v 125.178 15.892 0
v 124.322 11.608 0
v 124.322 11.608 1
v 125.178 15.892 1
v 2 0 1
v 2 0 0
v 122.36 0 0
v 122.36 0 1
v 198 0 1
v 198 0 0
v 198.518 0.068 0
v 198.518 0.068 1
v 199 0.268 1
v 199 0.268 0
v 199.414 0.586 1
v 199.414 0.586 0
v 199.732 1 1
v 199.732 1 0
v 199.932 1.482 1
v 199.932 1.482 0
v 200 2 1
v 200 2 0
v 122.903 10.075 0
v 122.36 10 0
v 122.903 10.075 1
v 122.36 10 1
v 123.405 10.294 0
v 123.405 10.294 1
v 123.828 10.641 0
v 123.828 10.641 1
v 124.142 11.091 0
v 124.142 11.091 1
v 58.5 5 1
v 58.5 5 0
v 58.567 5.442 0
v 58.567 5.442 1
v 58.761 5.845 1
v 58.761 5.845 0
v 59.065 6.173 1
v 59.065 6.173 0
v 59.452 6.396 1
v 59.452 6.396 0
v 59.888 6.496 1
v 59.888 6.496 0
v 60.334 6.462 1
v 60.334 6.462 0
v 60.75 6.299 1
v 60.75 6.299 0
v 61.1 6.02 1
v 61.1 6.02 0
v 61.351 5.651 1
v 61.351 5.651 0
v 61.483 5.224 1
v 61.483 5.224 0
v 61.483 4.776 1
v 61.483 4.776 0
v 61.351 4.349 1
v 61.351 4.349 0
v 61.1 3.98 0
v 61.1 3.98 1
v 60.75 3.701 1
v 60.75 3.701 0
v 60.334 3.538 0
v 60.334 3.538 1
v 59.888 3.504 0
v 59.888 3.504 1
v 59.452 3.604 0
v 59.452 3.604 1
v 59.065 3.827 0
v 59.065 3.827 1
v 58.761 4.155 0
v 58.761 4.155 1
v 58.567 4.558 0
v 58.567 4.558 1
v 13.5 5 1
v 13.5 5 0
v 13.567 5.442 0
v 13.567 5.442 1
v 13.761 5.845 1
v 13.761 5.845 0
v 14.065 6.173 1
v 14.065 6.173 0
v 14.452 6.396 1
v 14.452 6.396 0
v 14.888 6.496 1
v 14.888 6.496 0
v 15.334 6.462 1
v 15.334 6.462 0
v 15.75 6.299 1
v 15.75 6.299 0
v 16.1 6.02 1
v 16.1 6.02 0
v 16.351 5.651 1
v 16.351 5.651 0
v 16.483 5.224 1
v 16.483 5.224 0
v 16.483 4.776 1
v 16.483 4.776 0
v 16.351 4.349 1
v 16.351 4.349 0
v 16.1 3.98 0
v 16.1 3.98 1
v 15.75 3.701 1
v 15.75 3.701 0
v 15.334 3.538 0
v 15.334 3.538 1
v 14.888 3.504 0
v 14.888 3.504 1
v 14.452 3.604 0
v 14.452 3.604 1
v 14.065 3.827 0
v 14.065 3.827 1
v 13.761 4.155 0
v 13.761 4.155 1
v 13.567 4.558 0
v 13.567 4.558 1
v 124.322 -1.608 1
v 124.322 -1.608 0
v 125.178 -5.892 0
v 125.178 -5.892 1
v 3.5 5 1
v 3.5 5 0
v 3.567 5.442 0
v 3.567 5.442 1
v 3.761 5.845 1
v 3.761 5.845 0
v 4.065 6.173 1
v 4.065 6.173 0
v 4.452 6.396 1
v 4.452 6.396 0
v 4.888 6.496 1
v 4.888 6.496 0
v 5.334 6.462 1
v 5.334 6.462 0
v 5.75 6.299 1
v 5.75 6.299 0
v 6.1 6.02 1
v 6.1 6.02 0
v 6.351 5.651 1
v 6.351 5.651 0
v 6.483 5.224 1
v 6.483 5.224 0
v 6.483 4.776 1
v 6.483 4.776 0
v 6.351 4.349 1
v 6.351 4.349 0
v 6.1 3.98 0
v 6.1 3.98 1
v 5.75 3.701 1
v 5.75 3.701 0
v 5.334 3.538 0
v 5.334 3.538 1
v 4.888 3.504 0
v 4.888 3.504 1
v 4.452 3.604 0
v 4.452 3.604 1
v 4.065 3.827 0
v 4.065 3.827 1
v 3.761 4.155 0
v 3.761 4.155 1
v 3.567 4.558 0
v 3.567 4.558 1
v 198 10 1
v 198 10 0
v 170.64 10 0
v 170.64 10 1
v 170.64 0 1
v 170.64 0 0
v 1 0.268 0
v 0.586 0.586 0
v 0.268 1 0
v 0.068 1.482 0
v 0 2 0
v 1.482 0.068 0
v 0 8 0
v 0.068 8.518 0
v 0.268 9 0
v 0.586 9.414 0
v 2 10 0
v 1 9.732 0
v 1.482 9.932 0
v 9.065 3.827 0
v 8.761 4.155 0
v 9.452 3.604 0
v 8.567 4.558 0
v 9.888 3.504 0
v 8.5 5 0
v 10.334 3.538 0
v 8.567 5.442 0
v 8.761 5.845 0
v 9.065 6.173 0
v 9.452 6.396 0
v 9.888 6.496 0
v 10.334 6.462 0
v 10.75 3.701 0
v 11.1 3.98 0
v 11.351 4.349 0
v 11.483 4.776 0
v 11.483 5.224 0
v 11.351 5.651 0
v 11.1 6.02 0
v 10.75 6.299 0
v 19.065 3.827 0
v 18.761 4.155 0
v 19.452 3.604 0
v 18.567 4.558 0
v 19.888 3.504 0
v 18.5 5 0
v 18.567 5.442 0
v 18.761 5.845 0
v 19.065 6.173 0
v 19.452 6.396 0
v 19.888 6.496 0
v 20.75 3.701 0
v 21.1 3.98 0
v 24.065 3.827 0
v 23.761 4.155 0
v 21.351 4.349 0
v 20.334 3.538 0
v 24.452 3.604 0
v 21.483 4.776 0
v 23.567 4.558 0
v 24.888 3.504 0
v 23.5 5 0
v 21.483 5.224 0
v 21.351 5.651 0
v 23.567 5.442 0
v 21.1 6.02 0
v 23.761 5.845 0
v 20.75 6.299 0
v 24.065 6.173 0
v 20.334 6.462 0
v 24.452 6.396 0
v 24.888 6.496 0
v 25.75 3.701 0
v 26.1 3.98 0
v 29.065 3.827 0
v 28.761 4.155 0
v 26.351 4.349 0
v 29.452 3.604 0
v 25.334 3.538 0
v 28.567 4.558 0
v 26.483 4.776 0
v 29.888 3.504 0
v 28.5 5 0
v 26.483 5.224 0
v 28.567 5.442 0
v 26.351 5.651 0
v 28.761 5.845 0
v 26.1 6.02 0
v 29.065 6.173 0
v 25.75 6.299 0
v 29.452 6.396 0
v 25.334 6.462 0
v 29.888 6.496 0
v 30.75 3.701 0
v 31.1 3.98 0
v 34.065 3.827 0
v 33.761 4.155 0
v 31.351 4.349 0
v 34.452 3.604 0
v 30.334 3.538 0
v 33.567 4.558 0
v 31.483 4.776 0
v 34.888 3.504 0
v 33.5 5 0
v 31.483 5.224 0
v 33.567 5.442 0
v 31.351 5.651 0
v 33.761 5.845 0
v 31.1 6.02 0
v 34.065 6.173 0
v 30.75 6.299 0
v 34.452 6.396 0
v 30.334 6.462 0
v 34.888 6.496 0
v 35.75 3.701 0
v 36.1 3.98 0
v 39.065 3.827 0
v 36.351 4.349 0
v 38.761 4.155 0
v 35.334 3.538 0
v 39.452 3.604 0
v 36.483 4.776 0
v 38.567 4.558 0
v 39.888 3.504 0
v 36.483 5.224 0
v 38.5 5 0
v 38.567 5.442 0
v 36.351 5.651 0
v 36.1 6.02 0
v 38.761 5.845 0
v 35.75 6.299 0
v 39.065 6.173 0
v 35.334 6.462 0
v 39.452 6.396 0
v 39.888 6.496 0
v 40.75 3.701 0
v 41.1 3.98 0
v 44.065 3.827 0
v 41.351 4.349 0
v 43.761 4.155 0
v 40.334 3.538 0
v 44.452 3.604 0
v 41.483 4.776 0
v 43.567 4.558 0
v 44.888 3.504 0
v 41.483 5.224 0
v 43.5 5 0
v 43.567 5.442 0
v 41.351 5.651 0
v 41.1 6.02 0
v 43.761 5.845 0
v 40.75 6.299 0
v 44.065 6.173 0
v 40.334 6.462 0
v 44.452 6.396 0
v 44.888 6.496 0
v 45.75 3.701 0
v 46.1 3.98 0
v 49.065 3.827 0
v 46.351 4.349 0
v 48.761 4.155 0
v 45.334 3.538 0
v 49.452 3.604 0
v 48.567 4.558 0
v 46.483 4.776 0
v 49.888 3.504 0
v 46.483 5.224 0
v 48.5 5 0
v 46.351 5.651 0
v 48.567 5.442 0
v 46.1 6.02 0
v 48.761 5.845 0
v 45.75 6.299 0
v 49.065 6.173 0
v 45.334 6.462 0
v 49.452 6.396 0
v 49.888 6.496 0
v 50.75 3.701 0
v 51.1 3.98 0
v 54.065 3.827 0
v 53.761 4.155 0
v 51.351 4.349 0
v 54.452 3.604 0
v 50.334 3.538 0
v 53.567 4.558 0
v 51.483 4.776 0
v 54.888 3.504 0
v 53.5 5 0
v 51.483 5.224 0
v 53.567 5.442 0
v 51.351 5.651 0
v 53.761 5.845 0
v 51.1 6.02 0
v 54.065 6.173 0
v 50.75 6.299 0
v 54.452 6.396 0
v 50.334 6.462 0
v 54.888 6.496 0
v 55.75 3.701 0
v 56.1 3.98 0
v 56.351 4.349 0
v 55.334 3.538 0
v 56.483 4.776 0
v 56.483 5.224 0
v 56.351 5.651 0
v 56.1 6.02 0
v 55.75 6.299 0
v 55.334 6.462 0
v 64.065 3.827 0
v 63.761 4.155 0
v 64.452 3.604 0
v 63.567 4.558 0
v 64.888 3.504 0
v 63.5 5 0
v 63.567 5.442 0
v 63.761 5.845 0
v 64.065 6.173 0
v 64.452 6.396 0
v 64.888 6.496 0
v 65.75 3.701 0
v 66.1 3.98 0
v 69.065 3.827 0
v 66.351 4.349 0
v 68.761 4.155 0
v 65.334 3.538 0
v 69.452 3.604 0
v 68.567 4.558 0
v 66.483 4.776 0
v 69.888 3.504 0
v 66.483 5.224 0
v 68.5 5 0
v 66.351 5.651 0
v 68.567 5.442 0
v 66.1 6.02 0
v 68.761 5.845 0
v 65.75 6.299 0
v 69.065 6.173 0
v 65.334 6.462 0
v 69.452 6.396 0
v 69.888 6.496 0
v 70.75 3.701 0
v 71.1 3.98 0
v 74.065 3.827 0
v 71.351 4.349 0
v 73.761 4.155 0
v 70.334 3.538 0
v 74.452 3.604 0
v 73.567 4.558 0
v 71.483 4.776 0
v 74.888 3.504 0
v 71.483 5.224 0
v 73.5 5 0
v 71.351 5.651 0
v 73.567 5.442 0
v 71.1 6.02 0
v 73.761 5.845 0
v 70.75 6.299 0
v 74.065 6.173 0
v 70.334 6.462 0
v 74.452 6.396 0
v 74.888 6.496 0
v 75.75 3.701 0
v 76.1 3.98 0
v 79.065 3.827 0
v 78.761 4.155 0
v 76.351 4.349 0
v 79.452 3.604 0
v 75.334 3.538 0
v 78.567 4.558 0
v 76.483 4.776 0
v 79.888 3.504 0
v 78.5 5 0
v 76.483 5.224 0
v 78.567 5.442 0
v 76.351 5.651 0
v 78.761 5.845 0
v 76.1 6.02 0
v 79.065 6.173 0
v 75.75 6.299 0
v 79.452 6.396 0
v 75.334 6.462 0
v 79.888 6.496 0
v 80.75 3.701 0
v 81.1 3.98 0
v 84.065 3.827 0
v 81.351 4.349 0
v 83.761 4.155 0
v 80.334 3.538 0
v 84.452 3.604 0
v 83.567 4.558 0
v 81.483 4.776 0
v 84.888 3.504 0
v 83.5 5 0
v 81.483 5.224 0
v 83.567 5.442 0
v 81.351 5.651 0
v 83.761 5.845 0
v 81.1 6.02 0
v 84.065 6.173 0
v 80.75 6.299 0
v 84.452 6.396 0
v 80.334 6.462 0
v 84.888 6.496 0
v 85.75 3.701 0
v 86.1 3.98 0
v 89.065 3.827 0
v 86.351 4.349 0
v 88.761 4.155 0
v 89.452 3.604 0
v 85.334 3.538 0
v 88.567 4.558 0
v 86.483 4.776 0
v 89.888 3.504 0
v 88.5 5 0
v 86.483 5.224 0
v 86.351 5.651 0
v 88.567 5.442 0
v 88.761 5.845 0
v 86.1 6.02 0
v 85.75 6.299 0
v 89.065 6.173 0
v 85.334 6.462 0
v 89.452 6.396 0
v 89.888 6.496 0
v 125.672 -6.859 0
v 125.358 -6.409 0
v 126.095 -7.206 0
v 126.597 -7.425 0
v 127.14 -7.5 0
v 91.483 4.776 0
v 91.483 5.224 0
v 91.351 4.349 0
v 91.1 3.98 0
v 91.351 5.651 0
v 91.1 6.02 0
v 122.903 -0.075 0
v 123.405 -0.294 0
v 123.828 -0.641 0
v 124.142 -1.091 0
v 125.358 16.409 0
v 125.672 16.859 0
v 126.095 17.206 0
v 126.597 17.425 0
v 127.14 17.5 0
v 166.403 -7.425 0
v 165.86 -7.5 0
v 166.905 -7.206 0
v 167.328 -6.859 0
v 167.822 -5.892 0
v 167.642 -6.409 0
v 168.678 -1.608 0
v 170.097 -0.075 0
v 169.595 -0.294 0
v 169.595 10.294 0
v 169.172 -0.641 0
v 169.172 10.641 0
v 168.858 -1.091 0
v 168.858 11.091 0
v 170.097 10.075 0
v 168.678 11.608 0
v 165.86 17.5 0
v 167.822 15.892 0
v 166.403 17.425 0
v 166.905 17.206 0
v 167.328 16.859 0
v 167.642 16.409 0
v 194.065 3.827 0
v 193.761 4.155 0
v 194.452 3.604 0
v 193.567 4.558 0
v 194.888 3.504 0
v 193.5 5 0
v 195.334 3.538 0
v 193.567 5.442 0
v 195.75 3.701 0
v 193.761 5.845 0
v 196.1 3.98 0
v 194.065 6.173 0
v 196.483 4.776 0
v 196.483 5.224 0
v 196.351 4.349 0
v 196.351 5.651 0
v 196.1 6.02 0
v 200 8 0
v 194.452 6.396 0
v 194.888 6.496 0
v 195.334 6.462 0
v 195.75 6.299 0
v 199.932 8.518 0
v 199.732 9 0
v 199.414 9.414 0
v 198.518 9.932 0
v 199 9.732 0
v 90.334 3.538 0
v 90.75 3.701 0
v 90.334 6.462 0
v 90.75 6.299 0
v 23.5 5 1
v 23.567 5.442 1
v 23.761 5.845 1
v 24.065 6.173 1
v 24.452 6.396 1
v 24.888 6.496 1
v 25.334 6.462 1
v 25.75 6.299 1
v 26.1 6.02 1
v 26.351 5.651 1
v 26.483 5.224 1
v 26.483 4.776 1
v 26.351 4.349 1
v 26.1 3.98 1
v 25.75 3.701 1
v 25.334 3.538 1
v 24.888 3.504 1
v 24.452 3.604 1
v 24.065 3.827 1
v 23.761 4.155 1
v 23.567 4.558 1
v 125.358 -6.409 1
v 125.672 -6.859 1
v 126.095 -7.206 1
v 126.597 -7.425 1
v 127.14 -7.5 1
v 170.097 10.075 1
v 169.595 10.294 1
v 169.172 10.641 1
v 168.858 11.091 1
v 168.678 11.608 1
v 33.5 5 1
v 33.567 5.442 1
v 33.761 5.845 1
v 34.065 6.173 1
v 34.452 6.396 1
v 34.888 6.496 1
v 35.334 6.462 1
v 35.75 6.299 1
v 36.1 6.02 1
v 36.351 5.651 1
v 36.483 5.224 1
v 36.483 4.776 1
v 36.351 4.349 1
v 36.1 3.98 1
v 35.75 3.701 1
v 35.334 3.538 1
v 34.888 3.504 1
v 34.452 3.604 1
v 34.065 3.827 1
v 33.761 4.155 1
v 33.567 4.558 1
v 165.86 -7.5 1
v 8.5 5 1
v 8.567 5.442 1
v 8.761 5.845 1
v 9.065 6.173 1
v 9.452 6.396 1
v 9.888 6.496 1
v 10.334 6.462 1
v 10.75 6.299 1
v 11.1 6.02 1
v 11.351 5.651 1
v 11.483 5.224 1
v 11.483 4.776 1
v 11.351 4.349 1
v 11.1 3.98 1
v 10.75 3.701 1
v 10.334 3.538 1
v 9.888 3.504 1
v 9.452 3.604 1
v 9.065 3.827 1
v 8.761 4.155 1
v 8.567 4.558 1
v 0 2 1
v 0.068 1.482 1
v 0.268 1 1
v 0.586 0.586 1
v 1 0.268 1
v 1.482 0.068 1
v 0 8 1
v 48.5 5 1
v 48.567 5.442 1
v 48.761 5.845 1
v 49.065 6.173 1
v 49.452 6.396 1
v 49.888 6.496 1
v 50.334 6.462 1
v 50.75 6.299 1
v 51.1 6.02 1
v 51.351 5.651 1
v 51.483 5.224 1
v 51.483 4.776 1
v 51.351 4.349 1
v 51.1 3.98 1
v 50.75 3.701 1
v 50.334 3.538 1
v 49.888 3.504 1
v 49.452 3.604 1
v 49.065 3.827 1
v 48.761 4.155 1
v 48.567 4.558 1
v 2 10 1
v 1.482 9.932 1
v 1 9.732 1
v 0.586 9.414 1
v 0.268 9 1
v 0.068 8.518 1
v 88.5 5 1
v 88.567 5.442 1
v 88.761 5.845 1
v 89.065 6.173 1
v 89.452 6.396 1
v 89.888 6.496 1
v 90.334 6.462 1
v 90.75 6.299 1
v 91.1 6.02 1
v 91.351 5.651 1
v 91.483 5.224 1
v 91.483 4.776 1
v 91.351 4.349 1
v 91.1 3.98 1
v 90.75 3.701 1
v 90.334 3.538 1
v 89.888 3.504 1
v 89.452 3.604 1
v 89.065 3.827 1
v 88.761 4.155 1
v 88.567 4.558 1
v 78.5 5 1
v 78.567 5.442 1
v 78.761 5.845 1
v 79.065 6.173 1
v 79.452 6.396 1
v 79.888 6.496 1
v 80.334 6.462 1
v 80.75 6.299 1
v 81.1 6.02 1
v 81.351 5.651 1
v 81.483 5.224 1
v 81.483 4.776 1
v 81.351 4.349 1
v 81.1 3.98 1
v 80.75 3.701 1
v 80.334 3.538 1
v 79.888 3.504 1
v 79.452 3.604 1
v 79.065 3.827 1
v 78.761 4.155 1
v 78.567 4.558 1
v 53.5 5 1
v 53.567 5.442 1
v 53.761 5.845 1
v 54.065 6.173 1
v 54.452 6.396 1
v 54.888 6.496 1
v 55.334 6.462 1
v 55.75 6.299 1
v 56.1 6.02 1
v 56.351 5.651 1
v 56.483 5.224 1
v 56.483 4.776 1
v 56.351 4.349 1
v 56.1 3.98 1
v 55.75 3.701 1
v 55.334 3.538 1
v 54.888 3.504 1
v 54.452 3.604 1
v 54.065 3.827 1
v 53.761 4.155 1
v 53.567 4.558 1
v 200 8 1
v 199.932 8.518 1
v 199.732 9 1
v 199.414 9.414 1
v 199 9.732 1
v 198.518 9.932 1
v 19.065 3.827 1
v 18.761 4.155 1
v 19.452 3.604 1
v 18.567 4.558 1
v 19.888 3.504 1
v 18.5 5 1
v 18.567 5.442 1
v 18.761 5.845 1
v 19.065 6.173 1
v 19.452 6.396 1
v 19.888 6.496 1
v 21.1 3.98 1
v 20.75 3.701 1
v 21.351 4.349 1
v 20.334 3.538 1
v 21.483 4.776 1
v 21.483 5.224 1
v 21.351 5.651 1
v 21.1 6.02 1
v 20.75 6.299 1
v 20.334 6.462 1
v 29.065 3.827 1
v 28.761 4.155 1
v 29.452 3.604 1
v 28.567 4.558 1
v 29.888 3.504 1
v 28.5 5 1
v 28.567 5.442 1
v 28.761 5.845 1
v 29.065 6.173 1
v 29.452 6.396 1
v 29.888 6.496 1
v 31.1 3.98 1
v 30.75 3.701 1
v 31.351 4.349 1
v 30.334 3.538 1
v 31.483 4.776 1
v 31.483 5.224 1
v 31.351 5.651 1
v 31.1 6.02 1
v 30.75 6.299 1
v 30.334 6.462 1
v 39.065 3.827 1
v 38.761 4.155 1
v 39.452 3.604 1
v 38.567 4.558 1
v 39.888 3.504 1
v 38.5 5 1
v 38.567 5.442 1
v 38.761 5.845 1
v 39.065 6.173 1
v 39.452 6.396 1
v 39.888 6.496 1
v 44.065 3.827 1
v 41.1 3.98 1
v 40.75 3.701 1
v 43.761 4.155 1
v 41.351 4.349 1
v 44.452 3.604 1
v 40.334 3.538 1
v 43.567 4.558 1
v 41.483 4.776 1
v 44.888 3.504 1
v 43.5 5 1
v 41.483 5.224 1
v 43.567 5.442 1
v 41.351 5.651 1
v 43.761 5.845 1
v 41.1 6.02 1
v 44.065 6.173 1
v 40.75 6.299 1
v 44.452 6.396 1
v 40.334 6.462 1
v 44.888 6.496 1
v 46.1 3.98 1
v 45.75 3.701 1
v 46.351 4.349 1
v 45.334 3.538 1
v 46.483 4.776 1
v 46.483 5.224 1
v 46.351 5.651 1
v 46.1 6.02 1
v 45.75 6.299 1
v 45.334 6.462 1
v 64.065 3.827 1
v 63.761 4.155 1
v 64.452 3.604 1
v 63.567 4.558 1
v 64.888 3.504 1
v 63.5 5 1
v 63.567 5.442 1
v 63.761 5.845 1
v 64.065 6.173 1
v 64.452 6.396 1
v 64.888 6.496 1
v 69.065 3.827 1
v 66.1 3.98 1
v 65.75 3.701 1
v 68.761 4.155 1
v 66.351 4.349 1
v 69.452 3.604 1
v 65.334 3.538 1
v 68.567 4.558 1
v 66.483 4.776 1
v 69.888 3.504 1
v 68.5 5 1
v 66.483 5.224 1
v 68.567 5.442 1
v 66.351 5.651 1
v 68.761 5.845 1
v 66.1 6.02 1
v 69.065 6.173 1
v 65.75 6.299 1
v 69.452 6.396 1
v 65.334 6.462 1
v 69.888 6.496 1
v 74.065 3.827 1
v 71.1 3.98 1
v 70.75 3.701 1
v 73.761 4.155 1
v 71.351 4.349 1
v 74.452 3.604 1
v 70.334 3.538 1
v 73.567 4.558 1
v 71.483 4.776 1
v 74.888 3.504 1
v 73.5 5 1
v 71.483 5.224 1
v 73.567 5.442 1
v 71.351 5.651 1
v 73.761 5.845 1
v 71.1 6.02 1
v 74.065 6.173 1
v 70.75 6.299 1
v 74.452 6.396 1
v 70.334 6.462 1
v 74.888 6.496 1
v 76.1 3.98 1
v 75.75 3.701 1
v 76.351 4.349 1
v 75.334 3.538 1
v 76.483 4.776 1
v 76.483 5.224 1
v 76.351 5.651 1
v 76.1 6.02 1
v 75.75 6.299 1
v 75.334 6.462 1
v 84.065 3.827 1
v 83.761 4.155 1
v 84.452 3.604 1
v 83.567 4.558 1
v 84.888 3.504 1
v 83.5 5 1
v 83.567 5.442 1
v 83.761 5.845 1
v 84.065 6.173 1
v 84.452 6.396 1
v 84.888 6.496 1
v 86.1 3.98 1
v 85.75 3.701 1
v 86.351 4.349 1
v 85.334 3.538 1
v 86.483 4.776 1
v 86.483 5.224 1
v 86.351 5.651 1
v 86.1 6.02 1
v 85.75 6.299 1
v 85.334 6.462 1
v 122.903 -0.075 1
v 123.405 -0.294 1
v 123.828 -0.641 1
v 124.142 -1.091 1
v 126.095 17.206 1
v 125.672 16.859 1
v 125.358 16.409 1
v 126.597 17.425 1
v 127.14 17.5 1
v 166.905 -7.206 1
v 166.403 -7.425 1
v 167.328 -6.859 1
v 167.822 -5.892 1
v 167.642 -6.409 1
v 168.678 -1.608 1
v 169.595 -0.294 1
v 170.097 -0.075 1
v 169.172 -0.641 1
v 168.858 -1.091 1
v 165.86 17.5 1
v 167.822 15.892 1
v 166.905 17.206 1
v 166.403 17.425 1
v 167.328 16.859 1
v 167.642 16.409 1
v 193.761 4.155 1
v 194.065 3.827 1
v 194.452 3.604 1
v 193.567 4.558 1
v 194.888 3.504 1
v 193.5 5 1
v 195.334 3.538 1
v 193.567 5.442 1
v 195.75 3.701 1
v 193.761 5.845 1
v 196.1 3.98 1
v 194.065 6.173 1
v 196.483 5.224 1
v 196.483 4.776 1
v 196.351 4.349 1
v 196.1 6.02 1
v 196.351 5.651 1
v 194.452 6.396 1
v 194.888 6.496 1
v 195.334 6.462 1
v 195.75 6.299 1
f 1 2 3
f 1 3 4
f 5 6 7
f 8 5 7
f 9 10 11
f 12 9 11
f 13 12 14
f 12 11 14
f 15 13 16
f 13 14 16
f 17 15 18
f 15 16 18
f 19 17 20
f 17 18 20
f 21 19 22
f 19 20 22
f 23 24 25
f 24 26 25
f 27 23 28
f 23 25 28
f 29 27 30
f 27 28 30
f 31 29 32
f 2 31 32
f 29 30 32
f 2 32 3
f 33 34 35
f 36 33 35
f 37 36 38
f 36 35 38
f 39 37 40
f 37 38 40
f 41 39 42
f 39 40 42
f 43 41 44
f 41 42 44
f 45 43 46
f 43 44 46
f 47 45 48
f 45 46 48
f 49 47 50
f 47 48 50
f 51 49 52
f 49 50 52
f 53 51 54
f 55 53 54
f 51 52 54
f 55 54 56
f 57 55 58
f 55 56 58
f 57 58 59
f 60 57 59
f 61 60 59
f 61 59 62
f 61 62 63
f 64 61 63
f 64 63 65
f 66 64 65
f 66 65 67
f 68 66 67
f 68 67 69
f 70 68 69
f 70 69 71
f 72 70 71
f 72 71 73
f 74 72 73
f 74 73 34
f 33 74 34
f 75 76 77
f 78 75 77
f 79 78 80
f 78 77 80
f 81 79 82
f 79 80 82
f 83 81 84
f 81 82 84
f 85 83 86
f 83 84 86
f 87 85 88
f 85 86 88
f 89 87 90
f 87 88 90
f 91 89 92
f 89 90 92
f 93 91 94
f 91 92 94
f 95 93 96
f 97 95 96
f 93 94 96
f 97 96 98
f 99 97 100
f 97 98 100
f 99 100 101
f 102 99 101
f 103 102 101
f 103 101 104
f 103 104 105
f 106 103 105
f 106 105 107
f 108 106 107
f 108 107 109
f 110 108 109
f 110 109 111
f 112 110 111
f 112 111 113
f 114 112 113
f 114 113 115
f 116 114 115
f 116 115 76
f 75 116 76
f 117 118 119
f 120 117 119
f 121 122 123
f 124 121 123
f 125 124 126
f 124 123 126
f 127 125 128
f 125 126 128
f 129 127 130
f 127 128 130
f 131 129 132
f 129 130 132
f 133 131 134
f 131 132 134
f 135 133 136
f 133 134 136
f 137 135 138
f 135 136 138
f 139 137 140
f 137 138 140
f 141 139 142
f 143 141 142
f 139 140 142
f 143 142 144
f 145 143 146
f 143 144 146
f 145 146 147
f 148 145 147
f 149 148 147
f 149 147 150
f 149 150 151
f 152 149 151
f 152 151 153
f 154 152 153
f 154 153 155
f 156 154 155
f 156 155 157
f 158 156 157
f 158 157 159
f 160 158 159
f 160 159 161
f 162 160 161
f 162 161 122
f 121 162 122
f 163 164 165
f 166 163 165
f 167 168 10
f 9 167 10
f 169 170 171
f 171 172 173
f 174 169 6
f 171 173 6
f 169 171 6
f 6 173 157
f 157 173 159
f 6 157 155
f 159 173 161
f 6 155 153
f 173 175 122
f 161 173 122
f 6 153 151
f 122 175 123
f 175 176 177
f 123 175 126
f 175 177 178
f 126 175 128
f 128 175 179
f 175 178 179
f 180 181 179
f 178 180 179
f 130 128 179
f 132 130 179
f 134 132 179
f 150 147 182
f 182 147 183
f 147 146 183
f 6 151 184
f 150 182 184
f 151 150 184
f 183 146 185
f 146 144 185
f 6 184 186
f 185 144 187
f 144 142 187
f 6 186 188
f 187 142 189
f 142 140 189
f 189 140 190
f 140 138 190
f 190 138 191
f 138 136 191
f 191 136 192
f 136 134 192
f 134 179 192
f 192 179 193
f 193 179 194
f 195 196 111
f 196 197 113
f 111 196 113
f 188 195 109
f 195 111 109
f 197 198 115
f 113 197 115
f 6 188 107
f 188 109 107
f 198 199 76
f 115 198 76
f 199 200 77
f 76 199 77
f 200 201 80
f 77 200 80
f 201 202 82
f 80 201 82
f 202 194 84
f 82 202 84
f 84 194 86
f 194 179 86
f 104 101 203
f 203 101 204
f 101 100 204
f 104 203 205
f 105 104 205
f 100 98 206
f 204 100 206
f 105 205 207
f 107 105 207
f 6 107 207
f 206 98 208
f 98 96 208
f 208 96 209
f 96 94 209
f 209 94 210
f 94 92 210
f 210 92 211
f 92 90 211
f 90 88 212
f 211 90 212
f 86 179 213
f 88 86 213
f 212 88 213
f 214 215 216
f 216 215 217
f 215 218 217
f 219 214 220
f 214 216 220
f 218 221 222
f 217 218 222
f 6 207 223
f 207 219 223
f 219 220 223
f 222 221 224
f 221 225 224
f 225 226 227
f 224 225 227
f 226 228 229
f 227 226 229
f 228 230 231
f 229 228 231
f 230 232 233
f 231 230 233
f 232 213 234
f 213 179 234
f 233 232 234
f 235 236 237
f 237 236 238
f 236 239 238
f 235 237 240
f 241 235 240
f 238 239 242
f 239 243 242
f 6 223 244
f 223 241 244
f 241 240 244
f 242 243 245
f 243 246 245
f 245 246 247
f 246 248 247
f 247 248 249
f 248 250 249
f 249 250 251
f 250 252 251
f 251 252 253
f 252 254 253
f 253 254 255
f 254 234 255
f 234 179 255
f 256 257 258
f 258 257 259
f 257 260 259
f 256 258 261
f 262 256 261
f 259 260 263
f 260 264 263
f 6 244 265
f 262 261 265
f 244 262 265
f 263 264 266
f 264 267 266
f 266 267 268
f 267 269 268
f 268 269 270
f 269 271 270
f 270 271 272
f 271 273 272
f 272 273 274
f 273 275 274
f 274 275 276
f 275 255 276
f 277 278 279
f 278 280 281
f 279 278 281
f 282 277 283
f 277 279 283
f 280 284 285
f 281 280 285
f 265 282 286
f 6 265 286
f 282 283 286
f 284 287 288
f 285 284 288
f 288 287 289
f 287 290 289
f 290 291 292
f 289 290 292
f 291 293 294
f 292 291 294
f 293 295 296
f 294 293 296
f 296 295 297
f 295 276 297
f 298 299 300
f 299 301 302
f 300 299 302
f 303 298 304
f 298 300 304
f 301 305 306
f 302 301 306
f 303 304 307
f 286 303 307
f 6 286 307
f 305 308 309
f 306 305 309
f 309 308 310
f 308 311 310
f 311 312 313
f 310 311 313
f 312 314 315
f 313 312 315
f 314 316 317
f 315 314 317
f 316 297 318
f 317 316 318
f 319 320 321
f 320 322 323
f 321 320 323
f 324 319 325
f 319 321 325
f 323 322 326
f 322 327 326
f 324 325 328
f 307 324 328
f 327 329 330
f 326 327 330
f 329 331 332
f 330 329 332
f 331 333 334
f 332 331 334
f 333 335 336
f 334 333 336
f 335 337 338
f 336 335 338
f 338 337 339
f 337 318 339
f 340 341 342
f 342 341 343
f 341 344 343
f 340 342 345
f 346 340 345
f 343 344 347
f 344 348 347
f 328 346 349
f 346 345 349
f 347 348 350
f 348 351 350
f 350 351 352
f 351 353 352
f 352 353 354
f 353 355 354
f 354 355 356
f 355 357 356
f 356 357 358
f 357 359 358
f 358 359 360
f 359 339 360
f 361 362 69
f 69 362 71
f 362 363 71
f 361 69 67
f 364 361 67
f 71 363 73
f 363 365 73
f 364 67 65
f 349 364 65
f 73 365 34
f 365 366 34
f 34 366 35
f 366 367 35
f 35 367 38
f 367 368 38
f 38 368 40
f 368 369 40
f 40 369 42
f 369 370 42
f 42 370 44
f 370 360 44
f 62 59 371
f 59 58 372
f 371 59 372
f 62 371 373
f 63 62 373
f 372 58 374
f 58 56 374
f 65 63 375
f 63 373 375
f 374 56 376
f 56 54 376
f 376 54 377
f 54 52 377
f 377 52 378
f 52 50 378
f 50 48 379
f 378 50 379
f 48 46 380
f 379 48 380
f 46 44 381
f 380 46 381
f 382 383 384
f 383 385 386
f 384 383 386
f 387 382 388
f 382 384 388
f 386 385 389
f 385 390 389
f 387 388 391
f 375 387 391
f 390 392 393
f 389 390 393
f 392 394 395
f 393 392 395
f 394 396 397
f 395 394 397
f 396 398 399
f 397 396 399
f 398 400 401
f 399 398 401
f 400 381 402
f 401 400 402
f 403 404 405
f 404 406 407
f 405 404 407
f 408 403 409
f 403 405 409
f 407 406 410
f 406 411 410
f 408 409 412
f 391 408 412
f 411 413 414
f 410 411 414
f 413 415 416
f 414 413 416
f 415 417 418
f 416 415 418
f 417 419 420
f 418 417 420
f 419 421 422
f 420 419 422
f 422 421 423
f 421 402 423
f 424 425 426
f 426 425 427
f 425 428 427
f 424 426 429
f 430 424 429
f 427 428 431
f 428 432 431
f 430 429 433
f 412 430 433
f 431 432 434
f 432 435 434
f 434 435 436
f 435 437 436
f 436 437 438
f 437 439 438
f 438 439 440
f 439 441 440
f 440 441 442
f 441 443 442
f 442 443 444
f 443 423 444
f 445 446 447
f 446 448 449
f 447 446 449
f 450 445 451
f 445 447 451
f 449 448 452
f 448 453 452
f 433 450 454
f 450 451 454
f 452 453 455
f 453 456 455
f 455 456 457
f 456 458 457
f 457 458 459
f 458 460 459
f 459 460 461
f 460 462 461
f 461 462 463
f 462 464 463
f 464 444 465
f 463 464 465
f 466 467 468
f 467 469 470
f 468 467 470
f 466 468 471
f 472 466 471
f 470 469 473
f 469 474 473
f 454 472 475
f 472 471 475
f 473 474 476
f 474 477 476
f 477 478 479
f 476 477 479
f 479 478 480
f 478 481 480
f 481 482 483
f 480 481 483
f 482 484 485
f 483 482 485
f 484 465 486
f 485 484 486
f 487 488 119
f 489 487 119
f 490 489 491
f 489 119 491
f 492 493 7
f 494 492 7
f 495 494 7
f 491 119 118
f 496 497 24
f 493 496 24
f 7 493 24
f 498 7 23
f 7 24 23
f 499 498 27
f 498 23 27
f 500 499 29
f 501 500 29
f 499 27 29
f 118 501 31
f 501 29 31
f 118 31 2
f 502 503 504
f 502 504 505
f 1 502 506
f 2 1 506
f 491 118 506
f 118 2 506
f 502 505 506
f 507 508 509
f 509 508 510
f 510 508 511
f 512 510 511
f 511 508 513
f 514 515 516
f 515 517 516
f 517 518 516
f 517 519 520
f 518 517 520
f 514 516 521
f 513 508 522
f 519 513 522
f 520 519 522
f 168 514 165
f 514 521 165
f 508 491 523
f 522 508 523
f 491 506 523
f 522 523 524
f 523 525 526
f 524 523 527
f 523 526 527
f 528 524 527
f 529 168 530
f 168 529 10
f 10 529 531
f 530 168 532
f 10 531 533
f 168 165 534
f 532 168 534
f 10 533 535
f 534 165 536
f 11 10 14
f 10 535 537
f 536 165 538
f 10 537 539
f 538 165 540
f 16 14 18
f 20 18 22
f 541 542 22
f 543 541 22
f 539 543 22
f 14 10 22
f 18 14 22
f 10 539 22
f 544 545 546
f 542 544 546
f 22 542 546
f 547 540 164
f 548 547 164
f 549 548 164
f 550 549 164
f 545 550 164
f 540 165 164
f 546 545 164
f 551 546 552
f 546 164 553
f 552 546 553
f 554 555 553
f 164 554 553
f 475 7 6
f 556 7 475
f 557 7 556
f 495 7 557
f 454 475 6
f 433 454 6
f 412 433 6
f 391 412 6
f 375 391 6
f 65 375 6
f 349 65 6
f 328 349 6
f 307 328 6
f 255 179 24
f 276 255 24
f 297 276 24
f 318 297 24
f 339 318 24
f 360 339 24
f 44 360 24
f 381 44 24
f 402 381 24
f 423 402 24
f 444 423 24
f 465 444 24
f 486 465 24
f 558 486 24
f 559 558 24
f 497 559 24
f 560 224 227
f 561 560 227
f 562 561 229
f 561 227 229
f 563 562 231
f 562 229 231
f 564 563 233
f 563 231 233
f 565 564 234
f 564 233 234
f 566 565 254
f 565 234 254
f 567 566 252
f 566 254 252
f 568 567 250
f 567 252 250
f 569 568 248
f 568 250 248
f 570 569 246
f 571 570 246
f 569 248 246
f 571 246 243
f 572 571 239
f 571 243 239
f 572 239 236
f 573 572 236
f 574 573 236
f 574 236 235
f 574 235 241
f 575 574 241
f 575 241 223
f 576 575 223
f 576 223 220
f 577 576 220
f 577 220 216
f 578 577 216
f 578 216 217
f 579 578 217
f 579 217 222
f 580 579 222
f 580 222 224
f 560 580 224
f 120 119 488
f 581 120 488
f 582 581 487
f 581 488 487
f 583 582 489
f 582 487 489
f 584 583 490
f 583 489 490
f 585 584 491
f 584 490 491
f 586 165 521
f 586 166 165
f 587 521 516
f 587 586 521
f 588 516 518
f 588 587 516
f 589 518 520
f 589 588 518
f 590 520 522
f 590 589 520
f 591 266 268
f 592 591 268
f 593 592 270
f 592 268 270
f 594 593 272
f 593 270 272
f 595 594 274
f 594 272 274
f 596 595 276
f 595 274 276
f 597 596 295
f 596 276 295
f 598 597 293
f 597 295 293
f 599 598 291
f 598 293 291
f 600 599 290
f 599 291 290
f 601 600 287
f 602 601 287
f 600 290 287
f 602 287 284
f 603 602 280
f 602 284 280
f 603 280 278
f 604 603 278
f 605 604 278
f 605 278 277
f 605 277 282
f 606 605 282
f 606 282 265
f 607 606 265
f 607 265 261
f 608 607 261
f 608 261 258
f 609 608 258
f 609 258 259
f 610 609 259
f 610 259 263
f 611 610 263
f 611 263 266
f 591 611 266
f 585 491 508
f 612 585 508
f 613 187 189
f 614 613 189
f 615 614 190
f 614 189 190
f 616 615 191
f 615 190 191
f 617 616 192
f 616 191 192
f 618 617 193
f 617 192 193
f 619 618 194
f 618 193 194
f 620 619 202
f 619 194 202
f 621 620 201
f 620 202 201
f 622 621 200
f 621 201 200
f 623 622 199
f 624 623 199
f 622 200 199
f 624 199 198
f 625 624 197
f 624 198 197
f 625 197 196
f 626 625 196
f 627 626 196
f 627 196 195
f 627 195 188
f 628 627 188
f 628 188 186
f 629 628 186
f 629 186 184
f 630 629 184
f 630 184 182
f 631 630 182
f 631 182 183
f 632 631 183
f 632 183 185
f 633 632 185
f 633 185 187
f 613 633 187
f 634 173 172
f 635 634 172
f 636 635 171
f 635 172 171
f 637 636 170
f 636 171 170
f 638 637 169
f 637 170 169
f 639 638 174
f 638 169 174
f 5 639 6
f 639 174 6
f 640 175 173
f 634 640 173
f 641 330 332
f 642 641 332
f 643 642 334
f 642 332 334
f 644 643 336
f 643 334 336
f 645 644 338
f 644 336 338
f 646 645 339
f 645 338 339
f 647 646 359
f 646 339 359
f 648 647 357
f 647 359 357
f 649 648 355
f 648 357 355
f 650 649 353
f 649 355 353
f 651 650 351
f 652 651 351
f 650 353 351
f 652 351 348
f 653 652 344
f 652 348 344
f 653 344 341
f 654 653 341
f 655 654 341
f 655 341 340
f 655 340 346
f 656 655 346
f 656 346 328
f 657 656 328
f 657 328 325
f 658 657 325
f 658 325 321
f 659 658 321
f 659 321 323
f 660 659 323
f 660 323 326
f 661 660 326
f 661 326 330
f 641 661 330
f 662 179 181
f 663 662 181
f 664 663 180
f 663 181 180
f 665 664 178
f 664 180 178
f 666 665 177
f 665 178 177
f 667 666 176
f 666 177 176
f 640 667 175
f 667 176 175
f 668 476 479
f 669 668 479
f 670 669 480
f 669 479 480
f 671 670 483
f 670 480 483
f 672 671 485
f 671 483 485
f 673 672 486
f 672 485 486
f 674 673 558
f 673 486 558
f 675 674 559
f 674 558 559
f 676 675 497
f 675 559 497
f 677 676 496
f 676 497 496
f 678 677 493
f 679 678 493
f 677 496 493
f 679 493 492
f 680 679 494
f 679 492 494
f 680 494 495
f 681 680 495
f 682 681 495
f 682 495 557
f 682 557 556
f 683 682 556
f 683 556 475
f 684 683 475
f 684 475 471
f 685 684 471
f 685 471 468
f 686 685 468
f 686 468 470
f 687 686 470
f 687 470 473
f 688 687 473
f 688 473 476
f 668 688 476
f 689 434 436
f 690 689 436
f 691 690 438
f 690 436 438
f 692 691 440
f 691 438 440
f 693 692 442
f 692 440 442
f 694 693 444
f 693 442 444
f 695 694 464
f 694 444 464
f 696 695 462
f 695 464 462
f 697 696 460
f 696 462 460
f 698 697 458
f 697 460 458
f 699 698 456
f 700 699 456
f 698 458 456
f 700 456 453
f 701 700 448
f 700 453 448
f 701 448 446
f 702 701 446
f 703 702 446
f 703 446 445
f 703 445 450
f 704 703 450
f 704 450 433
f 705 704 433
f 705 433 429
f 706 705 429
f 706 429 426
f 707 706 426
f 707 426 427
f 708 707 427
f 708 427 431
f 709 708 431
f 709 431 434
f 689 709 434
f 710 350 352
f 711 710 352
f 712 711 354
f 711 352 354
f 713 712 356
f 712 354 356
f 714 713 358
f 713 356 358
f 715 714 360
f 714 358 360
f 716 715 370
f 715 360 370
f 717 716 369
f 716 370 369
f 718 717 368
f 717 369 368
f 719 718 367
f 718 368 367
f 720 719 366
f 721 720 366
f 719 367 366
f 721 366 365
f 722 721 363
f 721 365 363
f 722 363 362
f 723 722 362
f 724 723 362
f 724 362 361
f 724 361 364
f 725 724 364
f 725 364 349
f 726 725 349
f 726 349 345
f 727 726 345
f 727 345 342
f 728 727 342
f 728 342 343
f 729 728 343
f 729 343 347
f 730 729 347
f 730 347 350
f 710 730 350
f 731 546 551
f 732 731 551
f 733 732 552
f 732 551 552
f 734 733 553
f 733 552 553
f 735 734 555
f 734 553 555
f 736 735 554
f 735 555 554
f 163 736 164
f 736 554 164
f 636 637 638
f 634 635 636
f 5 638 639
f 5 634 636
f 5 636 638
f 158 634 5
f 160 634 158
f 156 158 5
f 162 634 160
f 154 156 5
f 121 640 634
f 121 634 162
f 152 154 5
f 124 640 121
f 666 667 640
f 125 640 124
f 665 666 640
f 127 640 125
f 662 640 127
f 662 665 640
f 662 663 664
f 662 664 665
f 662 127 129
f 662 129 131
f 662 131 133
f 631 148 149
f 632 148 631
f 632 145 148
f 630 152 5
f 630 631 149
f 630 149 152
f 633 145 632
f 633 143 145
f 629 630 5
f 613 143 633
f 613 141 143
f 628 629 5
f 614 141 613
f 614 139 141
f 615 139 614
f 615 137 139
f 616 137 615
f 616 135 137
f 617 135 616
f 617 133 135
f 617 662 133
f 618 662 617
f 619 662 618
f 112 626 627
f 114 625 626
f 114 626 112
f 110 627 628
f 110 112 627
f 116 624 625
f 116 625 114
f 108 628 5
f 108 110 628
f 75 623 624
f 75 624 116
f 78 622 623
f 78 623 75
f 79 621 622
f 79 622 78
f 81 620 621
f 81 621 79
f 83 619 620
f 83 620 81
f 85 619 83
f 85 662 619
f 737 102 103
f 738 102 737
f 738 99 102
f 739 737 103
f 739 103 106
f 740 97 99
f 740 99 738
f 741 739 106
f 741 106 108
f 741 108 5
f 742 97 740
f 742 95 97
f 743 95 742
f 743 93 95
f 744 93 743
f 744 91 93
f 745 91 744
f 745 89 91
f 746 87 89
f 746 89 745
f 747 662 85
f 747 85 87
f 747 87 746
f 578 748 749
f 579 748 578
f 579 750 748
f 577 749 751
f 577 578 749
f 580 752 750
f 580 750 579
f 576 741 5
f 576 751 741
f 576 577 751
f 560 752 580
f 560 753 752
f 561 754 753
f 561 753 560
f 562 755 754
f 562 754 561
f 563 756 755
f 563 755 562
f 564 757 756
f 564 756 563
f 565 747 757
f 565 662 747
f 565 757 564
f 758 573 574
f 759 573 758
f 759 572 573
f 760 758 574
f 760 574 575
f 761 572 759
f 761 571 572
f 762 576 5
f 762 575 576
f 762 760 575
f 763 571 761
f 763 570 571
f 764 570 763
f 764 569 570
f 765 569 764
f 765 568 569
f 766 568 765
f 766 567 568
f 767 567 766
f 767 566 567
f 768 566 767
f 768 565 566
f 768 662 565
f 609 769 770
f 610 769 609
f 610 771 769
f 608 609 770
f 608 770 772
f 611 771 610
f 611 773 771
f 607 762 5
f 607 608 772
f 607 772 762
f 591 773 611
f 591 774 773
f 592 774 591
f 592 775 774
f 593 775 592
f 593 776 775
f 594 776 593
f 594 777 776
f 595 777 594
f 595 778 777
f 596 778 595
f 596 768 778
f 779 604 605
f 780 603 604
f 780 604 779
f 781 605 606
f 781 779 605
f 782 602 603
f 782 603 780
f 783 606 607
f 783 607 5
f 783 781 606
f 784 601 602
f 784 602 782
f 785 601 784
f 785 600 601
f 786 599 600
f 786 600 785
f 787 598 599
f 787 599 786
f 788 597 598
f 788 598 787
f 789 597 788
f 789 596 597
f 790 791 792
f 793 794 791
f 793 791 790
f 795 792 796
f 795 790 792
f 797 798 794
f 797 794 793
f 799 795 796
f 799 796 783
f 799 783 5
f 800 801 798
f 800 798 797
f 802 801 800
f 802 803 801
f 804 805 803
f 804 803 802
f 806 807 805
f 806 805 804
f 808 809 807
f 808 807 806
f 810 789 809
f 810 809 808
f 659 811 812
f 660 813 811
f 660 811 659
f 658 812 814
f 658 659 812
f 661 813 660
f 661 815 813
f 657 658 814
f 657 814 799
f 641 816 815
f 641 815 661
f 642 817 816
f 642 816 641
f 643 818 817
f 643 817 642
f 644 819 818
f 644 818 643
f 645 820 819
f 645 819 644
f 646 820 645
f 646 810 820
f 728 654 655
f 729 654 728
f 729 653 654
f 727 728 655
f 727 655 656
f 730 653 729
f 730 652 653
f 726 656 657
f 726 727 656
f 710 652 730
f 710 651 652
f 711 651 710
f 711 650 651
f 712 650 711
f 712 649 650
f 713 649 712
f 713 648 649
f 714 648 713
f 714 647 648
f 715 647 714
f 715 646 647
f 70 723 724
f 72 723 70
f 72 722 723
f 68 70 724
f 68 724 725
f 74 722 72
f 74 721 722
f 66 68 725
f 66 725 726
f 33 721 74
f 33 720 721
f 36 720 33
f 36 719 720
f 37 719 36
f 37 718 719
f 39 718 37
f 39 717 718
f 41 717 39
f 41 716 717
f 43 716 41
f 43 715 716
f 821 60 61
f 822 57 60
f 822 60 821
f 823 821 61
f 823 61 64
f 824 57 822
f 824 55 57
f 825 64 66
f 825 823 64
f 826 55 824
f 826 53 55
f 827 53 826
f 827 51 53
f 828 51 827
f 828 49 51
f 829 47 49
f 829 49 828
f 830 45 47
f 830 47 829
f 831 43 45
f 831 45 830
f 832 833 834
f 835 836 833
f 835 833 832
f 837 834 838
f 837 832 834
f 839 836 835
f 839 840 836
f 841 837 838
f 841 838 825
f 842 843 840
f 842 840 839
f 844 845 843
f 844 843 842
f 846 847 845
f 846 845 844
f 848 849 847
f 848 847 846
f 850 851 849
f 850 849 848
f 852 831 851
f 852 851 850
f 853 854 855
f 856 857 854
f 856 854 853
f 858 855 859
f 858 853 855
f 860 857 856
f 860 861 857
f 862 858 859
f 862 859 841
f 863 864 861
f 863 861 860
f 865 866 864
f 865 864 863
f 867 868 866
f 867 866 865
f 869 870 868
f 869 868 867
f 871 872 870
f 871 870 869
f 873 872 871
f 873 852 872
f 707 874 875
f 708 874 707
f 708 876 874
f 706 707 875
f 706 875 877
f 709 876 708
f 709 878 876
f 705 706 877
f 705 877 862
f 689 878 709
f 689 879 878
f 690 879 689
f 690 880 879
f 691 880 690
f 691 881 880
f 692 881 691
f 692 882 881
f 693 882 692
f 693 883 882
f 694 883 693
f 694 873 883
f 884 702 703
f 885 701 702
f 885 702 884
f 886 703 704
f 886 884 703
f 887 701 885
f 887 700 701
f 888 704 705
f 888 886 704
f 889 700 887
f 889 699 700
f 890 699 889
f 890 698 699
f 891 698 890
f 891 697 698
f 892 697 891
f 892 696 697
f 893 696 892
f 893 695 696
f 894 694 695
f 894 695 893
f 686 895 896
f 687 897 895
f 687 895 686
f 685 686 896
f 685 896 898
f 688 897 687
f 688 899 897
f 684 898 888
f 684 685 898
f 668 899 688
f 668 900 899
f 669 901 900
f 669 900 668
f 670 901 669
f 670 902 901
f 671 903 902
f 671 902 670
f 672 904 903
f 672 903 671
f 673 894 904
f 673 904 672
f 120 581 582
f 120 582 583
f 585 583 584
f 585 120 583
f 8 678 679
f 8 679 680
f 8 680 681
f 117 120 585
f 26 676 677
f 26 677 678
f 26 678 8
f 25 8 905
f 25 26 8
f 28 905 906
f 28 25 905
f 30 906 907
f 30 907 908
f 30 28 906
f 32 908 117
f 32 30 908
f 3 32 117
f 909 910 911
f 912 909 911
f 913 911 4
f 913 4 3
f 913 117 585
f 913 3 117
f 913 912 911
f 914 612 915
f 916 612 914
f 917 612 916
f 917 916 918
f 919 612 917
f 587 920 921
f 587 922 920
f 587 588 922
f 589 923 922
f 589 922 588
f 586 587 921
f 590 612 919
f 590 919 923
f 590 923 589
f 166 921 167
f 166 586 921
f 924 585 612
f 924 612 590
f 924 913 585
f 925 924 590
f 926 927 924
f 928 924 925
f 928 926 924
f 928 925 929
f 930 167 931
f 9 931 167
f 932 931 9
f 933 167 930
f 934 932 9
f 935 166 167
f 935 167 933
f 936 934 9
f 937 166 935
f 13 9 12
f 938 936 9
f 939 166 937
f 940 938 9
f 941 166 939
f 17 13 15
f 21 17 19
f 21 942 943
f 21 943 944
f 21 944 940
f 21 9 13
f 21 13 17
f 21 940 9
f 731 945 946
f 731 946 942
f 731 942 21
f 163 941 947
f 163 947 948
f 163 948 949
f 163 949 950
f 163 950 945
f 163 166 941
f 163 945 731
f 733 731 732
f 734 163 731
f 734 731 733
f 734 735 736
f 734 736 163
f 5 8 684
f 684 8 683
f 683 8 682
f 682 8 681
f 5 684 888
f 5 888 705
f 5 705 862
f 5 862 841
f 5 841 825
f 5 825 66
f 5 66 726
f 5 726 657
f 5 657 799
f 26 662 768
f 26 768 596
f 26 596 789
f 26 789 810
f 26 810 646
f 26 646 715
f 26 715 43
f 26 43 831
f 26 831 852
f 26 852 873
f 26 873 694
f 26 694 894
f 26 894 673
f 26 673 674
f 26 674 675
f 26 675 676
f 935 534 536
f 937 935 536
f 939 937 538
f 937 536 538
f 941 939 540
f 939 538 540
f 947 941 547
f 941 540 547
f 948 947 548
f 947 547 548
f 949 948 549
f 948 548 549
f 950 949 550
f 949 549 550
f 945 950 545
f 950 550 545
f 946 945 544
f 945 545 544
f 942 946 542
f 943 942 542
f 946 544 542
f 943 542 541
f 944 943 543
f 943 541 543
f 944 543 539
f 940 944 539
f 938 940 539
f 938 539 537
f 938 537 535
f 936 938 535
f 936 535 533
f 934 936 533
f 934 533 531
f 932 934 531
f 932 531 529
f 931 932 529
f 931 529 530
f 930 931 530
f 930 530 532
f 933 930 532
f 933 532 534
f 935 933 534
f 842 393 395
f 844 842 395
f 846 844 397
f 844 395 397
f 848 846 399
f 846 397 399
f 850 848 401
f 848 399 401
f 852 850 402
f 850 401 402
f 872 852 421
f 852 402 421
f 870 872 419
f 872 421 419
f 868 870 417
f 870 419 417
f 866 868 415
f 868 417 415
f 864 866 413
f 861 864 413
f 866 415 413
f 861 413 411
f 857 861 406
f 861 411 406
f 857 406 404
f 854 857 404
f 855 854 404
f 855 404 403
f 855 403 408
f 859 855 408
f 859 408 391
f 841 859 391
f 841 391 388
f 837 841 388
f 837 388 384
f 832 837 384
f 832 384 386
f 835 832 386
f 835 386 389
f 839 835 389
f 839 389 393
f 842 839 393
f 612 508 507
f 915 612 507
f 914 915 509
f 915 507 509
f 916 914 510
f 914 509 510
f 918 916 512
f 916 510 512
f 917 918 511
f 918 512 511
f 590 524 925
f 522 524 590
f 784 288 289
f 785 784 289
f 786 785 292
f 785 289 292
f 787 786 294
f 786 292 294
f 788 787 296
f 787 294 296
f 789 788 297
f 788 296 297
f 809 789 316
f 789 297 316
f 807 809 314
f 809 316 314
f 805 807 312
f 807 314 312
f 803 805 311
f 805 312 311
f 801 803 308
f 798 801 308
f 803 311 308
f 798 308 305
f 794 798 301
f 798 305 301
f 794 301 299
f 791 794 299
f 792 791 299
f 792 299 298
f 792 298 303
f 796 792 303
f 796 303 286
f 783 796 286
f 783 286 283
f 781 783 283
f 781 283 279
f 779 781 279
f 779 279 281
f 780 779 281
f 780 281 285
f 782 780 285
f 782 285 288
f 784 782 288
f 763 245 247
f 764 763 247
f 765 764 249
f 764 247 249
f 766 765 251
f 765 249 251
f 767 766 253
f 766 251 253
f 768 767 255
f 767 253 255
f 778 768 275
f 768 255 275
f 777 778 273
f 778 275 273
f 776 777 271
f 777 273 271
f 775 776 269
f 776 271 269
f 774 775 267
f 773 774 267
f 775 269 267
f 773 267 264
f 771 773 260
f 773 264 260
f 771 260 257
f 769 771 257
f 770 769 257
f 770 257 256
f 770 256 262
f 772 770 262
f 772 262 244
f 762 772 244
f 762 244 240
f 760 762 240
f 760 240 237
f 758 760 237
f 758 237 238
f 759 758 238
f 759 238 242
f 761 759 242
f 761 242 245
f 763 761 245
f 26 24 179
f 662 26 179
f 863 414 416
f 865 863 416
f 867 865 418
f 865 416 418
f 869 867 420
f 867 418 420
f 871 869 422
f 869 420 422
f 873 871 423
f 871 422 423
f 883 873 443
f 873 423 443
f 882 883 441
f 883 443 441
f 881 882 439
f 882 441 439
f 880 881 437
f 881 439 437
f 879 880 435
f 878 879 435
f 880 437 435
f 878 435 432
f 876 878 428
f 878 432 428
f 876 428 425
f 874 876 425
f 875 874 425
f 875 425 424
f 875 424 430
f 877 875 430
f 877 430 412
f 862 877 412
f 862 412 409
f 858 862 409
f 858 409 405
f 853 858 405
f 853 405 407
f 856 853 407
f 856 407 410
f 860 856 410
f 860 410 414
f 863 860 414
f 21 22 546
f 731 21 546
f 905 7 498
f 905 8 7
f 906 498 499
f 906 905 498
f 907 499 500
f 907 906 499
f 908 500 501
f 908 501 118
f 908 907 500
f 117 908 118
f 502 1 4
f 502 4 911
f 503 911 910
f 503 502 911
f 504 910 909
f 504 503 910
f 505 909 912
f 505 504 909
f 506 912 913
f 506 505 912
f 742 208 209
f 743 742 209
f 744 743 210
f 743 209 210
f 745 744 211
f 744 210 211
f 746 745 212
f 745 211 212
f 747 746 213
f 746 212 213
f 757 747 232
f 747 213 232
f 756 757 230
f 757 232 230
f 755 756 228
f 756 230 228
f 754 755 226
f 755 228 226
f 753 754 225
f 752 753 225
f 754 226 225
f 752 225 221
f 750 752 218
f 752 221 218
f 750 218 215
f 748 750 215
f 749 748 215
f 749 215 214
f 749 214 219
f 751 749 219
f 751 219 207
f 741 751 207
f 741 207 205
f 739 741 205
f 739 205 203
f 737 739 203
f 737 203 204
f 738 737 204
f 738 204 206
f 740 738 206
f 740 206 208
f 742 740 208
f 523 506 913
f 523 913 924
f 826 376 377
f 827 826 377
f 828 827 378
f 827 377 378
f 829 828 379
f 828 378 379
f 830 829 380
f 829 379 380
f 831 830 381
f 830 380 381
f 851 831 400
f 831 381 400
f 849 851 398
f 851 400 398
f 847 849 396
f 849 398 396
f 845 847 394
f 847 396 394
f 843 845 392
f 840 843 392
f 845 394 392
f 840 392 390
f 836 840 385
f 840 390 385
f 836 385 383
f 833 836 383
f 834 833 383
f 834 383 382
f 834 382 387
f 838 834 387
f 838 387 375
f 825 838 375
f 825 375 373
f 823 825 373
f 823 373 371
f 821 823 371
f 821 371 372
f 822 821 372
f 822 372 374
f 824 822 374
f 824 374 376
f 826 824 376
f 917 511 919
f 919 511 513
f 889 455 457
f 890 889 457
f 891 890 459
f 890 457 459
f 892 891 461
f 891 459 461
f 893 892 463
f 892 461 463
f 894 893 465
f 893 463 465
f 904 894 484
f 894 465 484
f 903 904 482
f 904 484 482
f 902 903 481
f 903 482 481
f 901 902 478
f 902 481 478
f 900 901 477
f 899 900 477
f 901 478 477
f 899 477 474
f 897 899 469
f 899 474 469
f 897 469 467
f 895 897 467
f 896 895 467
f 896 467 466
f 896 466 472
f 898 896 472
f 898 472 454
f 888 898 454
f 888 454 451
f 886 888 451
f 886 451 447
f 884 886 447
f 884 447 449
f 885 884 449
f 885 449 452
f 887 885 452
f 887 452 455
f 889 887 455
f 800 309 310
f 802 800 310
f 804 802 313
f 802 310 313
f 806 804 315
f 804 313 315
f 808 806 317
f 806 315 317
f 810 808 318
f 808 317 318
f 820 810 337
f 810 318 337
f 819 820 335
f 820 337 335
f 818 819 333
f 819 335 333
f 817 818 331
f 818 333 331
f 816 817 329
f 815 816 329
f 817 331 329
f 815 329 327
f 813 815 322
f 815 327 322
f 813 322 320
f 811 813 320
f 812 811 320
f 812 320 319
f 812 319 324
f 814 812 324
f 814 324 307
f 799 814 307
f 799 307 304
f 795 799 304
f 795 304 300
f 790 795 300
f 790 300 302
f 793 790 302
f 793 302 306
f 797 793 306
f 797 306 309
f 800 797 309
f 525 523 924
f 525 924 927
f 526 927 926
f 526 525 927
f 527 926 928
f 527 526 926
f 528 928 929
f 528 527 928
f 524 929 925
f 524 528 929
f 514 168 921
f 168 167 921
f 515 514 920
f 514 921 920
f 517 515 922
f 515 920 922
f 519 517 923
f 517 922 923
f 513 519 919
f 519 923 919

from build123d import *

# Parameters (mm, degrees)
BOSS_EXTRUDE1_DEPTH = 1
BOSS_EXTRUDE2_DEPTH = 1
FILLET1_R           = 2
SKETCH4_R           = 1.5
CUT_EXTRUDE1_DEPTH  = 201.766655598


with BuildPart() as part:
    # Sketch2 → Boss-Extrude1 (new body)
    with BuildSketch(Plane.XY):
        with BuildLine():
            Line((2, 0), (198, 0))
            ThreePointArc((198, 0), (199.414213562, 0.585786438), (200, 2))
            Line((200, 2), (200, 8))
            ThreePointArc((200, 8), (199.414213562, 9.414213562), (198, 10))
            Line((198, 10), (2, 10))
            ThreePointArc((2, 10), (0.585786438, 9.414213562), (0, 8))
            Line((0, 8), (0, 2))
            ThreePointArc((0, 2), (0.585786438, 0.585786438), (2, 0))
        make_face()
    extrude(amount=BOSS_EXTRUDE1_DEPTH)

    # Sketch3 → Boss-Extrude2 (add)
    with BuildSketch(Plane(origin=(0, 0, 0), x_dir=(-1, 0, 0), z_dir=(0, 0, -1))):
        with BuildLine():
            Line((-124, 0), (-125.178446454, -5.89223227))
            ThreePointArc((-125.178446454, -5.89223227), (-125.871629994, -7.046684283), (-127.139607805, -7.5))
            Line((-127.139607805, -7.5), (-165.860392195, -7.5))
            ThreePointArc((-165.860392195, -7.5), (-167.128370006, -7.046684283), (-167.821553546, -5.89223227))
            Line((-167.821553546, -5.89223227), (-169, 0))
            Line((-169, 0), (-124, 0))
        make_face()
        with BuildLine():
            Line((-169, 10), (-124, 10))
            Line((-124, 10), (-125.178446454, 15.89223227))
            ThreePointArc((-125.178446454, 15.89223227), (-125.871629994, 17.046684283), (-127.139607805, 17.5))
            Line((-127.139607805, 17.5), (-165.860392195, 17.5))
            ThreePointArc((-165.860392195, 17.5), (-167.128370006, 17.046684283), (-167.821553546, 15.89223227))
            Line((-167.821553546, 15.89223227), (-169, 10))
        make_face()
    extrude(amount=-BOSS_EXTRUDE2_DEPTH)

    # Fillet1
    fillet1_edges = [part.edges().sort_by_distance(p)[0] for p in [
        (169, 0, 0.5),
        (124, 0, 0.5),
        (124, 10, 0.5),
        (169, 10, 0.5),
    ]]
    fillet(fillet1_edges, radius=FILLET1_R)

    # Sketch4 → Cut-Extrude1 (cut, through all)
    with BuildSketch(Plane(origin=(0, 0, 0), x_dir=(-1, 0, 0), z_dir=(0, 0, -1))):
        with Locations((-5, 5)):
            Circle(SKETCH4_R)
        with Locations((-10, 5)):
            Circle(SKETCH4_R)
        with Locations((-15, 5)):
            Circle(SKETCH4_R)
        with Locations((-20, 5)):
            Circle(SKETCH4_R)
        with Locations((-25, 5)):
            Circle(SKETCH4_R)
        with Locations((-30, 5)):
            Circle(SKETCH4_R)
        with Locations((-195, 5)):
            Circle(SKETCH4_R)
        with Locations((-35, 5)):
            Circle(SKETCH4_R)
        with Locations((-40, 5)):
            Circle(SKETCH4_R)
        with Locations((-45, 5)):
            Circle(SKETCH4_R)
        with Locations((-50, 5)):
            Circle(SKETCH4_R)
        with Locations((-55, 5)):
            Circle(SKETCH4_R)
        with Locations((-60, 5)):
            Circle(SKETCH4_R)
        with Locations((-65, 5)):
            Circle(SKETCH4_R)
        with Locations((-70, 5)):
            Circle(SKETCH4_R)
        with Locations((-75, 5)):
            Circle(SKETCH4_R)
        with Locations((-80, 5)):
            Circle(SKETCH4_R)
        with Locations((-85, 5)):
            Circle(SKETCH4_R)
        with Locations((-90, 5)):
            Circle(SKETCH4_R)
    extrude(amount=-CUT_EXTRUDE1_DEPTH, mode=Mode.SUBTRACT)


solid = part.part
